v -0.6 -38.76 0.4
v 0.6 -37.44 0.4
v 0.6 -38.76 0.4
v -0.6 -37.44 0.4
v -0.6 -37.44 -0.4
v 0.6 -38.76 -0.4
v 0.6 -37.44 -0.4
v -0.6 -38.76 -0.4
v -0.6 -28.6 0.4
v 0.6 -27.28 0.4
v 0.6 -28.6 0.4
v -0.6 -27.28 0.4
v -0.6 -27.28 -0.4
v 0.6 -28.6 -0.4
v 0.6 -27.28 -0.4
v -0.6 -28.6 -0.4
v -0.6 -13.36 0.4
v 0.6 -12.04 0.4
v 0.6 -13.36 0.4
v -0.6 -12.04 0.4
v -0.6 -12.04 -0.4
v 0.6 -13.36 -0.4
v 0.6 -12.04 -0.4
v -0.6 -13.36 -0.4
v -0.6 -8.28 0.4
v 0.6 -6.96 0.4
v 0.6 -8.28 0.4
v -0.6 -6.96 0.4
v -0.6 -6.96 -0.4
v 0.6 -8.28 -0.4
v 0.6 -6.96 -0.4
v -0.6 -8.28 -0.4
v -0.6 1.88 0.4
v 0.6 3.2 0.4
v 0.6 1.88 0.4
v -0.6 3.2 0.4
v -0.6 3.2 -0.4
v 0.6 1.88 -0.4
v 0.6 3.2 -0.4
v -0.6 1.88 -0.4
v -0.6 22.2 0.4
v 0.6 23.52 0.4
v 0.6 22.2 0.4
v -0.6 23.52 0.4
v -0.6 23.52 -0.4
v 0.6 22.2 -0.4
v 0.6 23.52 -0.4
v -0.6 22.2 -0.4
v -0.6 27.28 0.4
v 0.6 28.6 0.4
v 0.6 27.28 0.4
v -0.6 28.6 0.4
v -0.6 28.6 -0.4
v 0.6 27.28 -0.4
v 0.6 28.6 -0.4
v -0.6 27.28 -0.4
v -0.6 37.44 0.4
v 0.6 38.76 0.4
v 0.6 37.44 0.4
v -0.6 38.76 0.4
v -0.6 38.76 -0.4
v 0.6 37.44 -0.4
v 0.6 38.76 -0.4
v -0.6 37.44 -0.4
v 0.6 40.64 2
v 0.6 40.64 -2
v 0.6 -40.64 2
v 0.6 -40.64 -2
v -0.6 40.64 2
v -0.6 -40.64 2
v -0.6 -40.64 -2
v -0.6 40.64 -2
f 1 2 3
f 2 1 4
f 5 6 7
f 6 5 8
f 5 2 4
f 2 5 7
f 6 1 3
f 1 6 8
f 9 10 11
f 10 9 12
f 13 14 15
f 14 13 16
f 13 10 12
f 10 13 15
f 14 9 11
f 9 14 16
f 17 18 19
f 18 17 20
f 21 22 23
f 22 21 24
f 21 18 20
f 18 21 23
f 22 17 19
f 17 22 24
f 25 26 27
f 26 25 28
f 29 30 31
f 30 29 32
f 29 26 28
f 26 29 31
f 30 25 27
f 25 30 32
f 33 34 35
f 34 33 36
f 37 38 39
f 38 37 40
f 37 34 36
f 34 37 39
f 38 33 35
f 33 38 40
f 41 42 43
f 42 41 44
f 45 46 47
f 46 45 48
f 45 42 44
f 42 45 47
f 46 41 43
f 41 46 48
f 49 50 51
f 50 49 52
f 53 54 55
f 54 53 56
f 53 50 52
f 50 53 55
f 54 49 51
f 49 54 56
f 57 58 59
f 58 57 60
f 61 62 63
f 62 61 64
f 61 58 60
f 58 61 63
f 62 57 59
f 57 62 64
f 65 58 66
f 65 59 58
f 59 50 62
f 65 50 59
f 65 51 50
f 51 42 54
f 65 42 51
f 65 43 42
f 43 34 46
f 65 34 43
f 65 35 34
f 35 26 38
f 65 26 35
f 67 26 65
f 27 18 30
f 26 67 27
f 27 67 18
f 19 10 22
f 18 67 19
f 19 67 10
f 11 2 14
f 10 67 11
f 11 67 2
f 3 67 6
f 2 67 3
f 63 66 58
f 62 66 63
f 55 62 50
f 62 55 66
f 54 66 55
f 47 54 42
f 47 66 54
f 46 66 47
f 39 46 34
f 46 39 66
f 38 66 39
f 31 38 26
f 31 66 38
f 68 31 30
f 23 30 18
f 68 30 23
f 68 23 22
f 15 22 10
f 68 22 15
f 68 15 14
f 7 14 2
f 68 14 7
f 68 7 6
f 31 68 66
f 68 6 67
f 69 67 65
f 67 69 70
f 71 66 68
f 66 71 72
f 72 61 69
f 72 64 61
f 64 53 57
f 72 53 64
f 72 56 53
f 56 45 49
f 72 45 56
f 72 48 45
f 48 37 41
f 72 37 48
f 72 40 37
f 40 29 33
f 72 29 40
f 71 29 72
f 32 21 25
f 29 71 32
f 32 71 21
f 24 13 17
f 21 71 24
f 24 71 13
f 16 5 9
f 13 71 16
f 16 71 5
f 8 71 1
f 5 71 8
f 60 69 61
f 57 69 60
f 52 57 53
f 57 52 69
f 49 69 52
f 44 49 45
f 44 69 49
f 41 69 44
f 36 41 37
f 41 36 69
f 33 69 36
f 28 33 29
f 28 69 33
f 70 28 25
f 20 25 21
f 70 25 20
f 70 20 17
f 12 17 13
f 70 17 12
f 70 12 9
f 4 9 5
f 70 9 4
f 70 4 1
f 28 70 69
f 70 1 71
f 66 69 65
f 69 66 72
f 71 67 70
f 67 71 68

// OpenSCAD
// DND-76 — P2 mask medium: printed 4-plane louvre comb bar (one bar shown).
//
// EVIDENCE CLASS: CAD geometry. NOT a print, NOT a measurement ([DND-27]).
//
// A single comb bar carries one unary threshold plane for one bank: an open
// slot over every ARMED cell and a 2-line land over every DISARMED cell. The
// bar is stroked in a 1.60 mm guide channel (bar 1.20 mm -> 0.40 mm free,
// 0.20 mm after worst-case tolerance). Four such bars form the stack; they are
// indexed by one camshaft per bank driven off the platen stroke.
//
// The bar is drawn with the ACTIVE slot pattern as a parameter (armed = true)
// so a reader can see the medium; a real map sets the pattern per bank.
//
// Units: mm. Target process: Bambu X1C, PLA, 0.4 mm nozzle, 0.20 mm layers.

PITCH = 5.08;
N_COLS = 80;
LOUVRE_BAR_T = 1.20;               // 3 lines, load-bearing
LOUVRE_SLOT_WEB = 1.32;            // 3-line land between slots
LOUVRE_GUIDE_SLOT = 1.60;
BAR_LEN = N_COLS * PITCH;          // 406.4 mm (split into printable segments)
SLOT_T = 0.80;                     // vertical slot height (Z), through the bar

// For a printable, bed-fitting render show a 16-cell segment of the bar.
SEG_CELLS = 16;

module comb_bar_segment(armed_mask) {
    // armed_mask: a vector of 0/1, one per cell in the segment.
    w = LOUVRE_BAR_T;
    len = SEG_CELLS * PITCH;
    difference() {
        color([0.4, 0.4, 0.8])
            cube([w, len, 4.0], center = true);
        for (i = [0 : SEG_CELLS - 1]) {
            if (armed_mask[i] == 1) {
                // an open slot over an armed cell
                translate([0, (i - (SEG_CELLS - 1) / 2) * PITCH, 0])
                    cube([w + 2, LOUVRE_SLOT_WEB, SLOT_T], center = true);
            }
        }
    }
}

// Example pattern for viewing (arbitrary).
example = [1, 0, 1, 0, 0, 1, 1, 0, 1, 0, 0, 0, 1, 1, 0, 1];
comb_bar_segment(example);
